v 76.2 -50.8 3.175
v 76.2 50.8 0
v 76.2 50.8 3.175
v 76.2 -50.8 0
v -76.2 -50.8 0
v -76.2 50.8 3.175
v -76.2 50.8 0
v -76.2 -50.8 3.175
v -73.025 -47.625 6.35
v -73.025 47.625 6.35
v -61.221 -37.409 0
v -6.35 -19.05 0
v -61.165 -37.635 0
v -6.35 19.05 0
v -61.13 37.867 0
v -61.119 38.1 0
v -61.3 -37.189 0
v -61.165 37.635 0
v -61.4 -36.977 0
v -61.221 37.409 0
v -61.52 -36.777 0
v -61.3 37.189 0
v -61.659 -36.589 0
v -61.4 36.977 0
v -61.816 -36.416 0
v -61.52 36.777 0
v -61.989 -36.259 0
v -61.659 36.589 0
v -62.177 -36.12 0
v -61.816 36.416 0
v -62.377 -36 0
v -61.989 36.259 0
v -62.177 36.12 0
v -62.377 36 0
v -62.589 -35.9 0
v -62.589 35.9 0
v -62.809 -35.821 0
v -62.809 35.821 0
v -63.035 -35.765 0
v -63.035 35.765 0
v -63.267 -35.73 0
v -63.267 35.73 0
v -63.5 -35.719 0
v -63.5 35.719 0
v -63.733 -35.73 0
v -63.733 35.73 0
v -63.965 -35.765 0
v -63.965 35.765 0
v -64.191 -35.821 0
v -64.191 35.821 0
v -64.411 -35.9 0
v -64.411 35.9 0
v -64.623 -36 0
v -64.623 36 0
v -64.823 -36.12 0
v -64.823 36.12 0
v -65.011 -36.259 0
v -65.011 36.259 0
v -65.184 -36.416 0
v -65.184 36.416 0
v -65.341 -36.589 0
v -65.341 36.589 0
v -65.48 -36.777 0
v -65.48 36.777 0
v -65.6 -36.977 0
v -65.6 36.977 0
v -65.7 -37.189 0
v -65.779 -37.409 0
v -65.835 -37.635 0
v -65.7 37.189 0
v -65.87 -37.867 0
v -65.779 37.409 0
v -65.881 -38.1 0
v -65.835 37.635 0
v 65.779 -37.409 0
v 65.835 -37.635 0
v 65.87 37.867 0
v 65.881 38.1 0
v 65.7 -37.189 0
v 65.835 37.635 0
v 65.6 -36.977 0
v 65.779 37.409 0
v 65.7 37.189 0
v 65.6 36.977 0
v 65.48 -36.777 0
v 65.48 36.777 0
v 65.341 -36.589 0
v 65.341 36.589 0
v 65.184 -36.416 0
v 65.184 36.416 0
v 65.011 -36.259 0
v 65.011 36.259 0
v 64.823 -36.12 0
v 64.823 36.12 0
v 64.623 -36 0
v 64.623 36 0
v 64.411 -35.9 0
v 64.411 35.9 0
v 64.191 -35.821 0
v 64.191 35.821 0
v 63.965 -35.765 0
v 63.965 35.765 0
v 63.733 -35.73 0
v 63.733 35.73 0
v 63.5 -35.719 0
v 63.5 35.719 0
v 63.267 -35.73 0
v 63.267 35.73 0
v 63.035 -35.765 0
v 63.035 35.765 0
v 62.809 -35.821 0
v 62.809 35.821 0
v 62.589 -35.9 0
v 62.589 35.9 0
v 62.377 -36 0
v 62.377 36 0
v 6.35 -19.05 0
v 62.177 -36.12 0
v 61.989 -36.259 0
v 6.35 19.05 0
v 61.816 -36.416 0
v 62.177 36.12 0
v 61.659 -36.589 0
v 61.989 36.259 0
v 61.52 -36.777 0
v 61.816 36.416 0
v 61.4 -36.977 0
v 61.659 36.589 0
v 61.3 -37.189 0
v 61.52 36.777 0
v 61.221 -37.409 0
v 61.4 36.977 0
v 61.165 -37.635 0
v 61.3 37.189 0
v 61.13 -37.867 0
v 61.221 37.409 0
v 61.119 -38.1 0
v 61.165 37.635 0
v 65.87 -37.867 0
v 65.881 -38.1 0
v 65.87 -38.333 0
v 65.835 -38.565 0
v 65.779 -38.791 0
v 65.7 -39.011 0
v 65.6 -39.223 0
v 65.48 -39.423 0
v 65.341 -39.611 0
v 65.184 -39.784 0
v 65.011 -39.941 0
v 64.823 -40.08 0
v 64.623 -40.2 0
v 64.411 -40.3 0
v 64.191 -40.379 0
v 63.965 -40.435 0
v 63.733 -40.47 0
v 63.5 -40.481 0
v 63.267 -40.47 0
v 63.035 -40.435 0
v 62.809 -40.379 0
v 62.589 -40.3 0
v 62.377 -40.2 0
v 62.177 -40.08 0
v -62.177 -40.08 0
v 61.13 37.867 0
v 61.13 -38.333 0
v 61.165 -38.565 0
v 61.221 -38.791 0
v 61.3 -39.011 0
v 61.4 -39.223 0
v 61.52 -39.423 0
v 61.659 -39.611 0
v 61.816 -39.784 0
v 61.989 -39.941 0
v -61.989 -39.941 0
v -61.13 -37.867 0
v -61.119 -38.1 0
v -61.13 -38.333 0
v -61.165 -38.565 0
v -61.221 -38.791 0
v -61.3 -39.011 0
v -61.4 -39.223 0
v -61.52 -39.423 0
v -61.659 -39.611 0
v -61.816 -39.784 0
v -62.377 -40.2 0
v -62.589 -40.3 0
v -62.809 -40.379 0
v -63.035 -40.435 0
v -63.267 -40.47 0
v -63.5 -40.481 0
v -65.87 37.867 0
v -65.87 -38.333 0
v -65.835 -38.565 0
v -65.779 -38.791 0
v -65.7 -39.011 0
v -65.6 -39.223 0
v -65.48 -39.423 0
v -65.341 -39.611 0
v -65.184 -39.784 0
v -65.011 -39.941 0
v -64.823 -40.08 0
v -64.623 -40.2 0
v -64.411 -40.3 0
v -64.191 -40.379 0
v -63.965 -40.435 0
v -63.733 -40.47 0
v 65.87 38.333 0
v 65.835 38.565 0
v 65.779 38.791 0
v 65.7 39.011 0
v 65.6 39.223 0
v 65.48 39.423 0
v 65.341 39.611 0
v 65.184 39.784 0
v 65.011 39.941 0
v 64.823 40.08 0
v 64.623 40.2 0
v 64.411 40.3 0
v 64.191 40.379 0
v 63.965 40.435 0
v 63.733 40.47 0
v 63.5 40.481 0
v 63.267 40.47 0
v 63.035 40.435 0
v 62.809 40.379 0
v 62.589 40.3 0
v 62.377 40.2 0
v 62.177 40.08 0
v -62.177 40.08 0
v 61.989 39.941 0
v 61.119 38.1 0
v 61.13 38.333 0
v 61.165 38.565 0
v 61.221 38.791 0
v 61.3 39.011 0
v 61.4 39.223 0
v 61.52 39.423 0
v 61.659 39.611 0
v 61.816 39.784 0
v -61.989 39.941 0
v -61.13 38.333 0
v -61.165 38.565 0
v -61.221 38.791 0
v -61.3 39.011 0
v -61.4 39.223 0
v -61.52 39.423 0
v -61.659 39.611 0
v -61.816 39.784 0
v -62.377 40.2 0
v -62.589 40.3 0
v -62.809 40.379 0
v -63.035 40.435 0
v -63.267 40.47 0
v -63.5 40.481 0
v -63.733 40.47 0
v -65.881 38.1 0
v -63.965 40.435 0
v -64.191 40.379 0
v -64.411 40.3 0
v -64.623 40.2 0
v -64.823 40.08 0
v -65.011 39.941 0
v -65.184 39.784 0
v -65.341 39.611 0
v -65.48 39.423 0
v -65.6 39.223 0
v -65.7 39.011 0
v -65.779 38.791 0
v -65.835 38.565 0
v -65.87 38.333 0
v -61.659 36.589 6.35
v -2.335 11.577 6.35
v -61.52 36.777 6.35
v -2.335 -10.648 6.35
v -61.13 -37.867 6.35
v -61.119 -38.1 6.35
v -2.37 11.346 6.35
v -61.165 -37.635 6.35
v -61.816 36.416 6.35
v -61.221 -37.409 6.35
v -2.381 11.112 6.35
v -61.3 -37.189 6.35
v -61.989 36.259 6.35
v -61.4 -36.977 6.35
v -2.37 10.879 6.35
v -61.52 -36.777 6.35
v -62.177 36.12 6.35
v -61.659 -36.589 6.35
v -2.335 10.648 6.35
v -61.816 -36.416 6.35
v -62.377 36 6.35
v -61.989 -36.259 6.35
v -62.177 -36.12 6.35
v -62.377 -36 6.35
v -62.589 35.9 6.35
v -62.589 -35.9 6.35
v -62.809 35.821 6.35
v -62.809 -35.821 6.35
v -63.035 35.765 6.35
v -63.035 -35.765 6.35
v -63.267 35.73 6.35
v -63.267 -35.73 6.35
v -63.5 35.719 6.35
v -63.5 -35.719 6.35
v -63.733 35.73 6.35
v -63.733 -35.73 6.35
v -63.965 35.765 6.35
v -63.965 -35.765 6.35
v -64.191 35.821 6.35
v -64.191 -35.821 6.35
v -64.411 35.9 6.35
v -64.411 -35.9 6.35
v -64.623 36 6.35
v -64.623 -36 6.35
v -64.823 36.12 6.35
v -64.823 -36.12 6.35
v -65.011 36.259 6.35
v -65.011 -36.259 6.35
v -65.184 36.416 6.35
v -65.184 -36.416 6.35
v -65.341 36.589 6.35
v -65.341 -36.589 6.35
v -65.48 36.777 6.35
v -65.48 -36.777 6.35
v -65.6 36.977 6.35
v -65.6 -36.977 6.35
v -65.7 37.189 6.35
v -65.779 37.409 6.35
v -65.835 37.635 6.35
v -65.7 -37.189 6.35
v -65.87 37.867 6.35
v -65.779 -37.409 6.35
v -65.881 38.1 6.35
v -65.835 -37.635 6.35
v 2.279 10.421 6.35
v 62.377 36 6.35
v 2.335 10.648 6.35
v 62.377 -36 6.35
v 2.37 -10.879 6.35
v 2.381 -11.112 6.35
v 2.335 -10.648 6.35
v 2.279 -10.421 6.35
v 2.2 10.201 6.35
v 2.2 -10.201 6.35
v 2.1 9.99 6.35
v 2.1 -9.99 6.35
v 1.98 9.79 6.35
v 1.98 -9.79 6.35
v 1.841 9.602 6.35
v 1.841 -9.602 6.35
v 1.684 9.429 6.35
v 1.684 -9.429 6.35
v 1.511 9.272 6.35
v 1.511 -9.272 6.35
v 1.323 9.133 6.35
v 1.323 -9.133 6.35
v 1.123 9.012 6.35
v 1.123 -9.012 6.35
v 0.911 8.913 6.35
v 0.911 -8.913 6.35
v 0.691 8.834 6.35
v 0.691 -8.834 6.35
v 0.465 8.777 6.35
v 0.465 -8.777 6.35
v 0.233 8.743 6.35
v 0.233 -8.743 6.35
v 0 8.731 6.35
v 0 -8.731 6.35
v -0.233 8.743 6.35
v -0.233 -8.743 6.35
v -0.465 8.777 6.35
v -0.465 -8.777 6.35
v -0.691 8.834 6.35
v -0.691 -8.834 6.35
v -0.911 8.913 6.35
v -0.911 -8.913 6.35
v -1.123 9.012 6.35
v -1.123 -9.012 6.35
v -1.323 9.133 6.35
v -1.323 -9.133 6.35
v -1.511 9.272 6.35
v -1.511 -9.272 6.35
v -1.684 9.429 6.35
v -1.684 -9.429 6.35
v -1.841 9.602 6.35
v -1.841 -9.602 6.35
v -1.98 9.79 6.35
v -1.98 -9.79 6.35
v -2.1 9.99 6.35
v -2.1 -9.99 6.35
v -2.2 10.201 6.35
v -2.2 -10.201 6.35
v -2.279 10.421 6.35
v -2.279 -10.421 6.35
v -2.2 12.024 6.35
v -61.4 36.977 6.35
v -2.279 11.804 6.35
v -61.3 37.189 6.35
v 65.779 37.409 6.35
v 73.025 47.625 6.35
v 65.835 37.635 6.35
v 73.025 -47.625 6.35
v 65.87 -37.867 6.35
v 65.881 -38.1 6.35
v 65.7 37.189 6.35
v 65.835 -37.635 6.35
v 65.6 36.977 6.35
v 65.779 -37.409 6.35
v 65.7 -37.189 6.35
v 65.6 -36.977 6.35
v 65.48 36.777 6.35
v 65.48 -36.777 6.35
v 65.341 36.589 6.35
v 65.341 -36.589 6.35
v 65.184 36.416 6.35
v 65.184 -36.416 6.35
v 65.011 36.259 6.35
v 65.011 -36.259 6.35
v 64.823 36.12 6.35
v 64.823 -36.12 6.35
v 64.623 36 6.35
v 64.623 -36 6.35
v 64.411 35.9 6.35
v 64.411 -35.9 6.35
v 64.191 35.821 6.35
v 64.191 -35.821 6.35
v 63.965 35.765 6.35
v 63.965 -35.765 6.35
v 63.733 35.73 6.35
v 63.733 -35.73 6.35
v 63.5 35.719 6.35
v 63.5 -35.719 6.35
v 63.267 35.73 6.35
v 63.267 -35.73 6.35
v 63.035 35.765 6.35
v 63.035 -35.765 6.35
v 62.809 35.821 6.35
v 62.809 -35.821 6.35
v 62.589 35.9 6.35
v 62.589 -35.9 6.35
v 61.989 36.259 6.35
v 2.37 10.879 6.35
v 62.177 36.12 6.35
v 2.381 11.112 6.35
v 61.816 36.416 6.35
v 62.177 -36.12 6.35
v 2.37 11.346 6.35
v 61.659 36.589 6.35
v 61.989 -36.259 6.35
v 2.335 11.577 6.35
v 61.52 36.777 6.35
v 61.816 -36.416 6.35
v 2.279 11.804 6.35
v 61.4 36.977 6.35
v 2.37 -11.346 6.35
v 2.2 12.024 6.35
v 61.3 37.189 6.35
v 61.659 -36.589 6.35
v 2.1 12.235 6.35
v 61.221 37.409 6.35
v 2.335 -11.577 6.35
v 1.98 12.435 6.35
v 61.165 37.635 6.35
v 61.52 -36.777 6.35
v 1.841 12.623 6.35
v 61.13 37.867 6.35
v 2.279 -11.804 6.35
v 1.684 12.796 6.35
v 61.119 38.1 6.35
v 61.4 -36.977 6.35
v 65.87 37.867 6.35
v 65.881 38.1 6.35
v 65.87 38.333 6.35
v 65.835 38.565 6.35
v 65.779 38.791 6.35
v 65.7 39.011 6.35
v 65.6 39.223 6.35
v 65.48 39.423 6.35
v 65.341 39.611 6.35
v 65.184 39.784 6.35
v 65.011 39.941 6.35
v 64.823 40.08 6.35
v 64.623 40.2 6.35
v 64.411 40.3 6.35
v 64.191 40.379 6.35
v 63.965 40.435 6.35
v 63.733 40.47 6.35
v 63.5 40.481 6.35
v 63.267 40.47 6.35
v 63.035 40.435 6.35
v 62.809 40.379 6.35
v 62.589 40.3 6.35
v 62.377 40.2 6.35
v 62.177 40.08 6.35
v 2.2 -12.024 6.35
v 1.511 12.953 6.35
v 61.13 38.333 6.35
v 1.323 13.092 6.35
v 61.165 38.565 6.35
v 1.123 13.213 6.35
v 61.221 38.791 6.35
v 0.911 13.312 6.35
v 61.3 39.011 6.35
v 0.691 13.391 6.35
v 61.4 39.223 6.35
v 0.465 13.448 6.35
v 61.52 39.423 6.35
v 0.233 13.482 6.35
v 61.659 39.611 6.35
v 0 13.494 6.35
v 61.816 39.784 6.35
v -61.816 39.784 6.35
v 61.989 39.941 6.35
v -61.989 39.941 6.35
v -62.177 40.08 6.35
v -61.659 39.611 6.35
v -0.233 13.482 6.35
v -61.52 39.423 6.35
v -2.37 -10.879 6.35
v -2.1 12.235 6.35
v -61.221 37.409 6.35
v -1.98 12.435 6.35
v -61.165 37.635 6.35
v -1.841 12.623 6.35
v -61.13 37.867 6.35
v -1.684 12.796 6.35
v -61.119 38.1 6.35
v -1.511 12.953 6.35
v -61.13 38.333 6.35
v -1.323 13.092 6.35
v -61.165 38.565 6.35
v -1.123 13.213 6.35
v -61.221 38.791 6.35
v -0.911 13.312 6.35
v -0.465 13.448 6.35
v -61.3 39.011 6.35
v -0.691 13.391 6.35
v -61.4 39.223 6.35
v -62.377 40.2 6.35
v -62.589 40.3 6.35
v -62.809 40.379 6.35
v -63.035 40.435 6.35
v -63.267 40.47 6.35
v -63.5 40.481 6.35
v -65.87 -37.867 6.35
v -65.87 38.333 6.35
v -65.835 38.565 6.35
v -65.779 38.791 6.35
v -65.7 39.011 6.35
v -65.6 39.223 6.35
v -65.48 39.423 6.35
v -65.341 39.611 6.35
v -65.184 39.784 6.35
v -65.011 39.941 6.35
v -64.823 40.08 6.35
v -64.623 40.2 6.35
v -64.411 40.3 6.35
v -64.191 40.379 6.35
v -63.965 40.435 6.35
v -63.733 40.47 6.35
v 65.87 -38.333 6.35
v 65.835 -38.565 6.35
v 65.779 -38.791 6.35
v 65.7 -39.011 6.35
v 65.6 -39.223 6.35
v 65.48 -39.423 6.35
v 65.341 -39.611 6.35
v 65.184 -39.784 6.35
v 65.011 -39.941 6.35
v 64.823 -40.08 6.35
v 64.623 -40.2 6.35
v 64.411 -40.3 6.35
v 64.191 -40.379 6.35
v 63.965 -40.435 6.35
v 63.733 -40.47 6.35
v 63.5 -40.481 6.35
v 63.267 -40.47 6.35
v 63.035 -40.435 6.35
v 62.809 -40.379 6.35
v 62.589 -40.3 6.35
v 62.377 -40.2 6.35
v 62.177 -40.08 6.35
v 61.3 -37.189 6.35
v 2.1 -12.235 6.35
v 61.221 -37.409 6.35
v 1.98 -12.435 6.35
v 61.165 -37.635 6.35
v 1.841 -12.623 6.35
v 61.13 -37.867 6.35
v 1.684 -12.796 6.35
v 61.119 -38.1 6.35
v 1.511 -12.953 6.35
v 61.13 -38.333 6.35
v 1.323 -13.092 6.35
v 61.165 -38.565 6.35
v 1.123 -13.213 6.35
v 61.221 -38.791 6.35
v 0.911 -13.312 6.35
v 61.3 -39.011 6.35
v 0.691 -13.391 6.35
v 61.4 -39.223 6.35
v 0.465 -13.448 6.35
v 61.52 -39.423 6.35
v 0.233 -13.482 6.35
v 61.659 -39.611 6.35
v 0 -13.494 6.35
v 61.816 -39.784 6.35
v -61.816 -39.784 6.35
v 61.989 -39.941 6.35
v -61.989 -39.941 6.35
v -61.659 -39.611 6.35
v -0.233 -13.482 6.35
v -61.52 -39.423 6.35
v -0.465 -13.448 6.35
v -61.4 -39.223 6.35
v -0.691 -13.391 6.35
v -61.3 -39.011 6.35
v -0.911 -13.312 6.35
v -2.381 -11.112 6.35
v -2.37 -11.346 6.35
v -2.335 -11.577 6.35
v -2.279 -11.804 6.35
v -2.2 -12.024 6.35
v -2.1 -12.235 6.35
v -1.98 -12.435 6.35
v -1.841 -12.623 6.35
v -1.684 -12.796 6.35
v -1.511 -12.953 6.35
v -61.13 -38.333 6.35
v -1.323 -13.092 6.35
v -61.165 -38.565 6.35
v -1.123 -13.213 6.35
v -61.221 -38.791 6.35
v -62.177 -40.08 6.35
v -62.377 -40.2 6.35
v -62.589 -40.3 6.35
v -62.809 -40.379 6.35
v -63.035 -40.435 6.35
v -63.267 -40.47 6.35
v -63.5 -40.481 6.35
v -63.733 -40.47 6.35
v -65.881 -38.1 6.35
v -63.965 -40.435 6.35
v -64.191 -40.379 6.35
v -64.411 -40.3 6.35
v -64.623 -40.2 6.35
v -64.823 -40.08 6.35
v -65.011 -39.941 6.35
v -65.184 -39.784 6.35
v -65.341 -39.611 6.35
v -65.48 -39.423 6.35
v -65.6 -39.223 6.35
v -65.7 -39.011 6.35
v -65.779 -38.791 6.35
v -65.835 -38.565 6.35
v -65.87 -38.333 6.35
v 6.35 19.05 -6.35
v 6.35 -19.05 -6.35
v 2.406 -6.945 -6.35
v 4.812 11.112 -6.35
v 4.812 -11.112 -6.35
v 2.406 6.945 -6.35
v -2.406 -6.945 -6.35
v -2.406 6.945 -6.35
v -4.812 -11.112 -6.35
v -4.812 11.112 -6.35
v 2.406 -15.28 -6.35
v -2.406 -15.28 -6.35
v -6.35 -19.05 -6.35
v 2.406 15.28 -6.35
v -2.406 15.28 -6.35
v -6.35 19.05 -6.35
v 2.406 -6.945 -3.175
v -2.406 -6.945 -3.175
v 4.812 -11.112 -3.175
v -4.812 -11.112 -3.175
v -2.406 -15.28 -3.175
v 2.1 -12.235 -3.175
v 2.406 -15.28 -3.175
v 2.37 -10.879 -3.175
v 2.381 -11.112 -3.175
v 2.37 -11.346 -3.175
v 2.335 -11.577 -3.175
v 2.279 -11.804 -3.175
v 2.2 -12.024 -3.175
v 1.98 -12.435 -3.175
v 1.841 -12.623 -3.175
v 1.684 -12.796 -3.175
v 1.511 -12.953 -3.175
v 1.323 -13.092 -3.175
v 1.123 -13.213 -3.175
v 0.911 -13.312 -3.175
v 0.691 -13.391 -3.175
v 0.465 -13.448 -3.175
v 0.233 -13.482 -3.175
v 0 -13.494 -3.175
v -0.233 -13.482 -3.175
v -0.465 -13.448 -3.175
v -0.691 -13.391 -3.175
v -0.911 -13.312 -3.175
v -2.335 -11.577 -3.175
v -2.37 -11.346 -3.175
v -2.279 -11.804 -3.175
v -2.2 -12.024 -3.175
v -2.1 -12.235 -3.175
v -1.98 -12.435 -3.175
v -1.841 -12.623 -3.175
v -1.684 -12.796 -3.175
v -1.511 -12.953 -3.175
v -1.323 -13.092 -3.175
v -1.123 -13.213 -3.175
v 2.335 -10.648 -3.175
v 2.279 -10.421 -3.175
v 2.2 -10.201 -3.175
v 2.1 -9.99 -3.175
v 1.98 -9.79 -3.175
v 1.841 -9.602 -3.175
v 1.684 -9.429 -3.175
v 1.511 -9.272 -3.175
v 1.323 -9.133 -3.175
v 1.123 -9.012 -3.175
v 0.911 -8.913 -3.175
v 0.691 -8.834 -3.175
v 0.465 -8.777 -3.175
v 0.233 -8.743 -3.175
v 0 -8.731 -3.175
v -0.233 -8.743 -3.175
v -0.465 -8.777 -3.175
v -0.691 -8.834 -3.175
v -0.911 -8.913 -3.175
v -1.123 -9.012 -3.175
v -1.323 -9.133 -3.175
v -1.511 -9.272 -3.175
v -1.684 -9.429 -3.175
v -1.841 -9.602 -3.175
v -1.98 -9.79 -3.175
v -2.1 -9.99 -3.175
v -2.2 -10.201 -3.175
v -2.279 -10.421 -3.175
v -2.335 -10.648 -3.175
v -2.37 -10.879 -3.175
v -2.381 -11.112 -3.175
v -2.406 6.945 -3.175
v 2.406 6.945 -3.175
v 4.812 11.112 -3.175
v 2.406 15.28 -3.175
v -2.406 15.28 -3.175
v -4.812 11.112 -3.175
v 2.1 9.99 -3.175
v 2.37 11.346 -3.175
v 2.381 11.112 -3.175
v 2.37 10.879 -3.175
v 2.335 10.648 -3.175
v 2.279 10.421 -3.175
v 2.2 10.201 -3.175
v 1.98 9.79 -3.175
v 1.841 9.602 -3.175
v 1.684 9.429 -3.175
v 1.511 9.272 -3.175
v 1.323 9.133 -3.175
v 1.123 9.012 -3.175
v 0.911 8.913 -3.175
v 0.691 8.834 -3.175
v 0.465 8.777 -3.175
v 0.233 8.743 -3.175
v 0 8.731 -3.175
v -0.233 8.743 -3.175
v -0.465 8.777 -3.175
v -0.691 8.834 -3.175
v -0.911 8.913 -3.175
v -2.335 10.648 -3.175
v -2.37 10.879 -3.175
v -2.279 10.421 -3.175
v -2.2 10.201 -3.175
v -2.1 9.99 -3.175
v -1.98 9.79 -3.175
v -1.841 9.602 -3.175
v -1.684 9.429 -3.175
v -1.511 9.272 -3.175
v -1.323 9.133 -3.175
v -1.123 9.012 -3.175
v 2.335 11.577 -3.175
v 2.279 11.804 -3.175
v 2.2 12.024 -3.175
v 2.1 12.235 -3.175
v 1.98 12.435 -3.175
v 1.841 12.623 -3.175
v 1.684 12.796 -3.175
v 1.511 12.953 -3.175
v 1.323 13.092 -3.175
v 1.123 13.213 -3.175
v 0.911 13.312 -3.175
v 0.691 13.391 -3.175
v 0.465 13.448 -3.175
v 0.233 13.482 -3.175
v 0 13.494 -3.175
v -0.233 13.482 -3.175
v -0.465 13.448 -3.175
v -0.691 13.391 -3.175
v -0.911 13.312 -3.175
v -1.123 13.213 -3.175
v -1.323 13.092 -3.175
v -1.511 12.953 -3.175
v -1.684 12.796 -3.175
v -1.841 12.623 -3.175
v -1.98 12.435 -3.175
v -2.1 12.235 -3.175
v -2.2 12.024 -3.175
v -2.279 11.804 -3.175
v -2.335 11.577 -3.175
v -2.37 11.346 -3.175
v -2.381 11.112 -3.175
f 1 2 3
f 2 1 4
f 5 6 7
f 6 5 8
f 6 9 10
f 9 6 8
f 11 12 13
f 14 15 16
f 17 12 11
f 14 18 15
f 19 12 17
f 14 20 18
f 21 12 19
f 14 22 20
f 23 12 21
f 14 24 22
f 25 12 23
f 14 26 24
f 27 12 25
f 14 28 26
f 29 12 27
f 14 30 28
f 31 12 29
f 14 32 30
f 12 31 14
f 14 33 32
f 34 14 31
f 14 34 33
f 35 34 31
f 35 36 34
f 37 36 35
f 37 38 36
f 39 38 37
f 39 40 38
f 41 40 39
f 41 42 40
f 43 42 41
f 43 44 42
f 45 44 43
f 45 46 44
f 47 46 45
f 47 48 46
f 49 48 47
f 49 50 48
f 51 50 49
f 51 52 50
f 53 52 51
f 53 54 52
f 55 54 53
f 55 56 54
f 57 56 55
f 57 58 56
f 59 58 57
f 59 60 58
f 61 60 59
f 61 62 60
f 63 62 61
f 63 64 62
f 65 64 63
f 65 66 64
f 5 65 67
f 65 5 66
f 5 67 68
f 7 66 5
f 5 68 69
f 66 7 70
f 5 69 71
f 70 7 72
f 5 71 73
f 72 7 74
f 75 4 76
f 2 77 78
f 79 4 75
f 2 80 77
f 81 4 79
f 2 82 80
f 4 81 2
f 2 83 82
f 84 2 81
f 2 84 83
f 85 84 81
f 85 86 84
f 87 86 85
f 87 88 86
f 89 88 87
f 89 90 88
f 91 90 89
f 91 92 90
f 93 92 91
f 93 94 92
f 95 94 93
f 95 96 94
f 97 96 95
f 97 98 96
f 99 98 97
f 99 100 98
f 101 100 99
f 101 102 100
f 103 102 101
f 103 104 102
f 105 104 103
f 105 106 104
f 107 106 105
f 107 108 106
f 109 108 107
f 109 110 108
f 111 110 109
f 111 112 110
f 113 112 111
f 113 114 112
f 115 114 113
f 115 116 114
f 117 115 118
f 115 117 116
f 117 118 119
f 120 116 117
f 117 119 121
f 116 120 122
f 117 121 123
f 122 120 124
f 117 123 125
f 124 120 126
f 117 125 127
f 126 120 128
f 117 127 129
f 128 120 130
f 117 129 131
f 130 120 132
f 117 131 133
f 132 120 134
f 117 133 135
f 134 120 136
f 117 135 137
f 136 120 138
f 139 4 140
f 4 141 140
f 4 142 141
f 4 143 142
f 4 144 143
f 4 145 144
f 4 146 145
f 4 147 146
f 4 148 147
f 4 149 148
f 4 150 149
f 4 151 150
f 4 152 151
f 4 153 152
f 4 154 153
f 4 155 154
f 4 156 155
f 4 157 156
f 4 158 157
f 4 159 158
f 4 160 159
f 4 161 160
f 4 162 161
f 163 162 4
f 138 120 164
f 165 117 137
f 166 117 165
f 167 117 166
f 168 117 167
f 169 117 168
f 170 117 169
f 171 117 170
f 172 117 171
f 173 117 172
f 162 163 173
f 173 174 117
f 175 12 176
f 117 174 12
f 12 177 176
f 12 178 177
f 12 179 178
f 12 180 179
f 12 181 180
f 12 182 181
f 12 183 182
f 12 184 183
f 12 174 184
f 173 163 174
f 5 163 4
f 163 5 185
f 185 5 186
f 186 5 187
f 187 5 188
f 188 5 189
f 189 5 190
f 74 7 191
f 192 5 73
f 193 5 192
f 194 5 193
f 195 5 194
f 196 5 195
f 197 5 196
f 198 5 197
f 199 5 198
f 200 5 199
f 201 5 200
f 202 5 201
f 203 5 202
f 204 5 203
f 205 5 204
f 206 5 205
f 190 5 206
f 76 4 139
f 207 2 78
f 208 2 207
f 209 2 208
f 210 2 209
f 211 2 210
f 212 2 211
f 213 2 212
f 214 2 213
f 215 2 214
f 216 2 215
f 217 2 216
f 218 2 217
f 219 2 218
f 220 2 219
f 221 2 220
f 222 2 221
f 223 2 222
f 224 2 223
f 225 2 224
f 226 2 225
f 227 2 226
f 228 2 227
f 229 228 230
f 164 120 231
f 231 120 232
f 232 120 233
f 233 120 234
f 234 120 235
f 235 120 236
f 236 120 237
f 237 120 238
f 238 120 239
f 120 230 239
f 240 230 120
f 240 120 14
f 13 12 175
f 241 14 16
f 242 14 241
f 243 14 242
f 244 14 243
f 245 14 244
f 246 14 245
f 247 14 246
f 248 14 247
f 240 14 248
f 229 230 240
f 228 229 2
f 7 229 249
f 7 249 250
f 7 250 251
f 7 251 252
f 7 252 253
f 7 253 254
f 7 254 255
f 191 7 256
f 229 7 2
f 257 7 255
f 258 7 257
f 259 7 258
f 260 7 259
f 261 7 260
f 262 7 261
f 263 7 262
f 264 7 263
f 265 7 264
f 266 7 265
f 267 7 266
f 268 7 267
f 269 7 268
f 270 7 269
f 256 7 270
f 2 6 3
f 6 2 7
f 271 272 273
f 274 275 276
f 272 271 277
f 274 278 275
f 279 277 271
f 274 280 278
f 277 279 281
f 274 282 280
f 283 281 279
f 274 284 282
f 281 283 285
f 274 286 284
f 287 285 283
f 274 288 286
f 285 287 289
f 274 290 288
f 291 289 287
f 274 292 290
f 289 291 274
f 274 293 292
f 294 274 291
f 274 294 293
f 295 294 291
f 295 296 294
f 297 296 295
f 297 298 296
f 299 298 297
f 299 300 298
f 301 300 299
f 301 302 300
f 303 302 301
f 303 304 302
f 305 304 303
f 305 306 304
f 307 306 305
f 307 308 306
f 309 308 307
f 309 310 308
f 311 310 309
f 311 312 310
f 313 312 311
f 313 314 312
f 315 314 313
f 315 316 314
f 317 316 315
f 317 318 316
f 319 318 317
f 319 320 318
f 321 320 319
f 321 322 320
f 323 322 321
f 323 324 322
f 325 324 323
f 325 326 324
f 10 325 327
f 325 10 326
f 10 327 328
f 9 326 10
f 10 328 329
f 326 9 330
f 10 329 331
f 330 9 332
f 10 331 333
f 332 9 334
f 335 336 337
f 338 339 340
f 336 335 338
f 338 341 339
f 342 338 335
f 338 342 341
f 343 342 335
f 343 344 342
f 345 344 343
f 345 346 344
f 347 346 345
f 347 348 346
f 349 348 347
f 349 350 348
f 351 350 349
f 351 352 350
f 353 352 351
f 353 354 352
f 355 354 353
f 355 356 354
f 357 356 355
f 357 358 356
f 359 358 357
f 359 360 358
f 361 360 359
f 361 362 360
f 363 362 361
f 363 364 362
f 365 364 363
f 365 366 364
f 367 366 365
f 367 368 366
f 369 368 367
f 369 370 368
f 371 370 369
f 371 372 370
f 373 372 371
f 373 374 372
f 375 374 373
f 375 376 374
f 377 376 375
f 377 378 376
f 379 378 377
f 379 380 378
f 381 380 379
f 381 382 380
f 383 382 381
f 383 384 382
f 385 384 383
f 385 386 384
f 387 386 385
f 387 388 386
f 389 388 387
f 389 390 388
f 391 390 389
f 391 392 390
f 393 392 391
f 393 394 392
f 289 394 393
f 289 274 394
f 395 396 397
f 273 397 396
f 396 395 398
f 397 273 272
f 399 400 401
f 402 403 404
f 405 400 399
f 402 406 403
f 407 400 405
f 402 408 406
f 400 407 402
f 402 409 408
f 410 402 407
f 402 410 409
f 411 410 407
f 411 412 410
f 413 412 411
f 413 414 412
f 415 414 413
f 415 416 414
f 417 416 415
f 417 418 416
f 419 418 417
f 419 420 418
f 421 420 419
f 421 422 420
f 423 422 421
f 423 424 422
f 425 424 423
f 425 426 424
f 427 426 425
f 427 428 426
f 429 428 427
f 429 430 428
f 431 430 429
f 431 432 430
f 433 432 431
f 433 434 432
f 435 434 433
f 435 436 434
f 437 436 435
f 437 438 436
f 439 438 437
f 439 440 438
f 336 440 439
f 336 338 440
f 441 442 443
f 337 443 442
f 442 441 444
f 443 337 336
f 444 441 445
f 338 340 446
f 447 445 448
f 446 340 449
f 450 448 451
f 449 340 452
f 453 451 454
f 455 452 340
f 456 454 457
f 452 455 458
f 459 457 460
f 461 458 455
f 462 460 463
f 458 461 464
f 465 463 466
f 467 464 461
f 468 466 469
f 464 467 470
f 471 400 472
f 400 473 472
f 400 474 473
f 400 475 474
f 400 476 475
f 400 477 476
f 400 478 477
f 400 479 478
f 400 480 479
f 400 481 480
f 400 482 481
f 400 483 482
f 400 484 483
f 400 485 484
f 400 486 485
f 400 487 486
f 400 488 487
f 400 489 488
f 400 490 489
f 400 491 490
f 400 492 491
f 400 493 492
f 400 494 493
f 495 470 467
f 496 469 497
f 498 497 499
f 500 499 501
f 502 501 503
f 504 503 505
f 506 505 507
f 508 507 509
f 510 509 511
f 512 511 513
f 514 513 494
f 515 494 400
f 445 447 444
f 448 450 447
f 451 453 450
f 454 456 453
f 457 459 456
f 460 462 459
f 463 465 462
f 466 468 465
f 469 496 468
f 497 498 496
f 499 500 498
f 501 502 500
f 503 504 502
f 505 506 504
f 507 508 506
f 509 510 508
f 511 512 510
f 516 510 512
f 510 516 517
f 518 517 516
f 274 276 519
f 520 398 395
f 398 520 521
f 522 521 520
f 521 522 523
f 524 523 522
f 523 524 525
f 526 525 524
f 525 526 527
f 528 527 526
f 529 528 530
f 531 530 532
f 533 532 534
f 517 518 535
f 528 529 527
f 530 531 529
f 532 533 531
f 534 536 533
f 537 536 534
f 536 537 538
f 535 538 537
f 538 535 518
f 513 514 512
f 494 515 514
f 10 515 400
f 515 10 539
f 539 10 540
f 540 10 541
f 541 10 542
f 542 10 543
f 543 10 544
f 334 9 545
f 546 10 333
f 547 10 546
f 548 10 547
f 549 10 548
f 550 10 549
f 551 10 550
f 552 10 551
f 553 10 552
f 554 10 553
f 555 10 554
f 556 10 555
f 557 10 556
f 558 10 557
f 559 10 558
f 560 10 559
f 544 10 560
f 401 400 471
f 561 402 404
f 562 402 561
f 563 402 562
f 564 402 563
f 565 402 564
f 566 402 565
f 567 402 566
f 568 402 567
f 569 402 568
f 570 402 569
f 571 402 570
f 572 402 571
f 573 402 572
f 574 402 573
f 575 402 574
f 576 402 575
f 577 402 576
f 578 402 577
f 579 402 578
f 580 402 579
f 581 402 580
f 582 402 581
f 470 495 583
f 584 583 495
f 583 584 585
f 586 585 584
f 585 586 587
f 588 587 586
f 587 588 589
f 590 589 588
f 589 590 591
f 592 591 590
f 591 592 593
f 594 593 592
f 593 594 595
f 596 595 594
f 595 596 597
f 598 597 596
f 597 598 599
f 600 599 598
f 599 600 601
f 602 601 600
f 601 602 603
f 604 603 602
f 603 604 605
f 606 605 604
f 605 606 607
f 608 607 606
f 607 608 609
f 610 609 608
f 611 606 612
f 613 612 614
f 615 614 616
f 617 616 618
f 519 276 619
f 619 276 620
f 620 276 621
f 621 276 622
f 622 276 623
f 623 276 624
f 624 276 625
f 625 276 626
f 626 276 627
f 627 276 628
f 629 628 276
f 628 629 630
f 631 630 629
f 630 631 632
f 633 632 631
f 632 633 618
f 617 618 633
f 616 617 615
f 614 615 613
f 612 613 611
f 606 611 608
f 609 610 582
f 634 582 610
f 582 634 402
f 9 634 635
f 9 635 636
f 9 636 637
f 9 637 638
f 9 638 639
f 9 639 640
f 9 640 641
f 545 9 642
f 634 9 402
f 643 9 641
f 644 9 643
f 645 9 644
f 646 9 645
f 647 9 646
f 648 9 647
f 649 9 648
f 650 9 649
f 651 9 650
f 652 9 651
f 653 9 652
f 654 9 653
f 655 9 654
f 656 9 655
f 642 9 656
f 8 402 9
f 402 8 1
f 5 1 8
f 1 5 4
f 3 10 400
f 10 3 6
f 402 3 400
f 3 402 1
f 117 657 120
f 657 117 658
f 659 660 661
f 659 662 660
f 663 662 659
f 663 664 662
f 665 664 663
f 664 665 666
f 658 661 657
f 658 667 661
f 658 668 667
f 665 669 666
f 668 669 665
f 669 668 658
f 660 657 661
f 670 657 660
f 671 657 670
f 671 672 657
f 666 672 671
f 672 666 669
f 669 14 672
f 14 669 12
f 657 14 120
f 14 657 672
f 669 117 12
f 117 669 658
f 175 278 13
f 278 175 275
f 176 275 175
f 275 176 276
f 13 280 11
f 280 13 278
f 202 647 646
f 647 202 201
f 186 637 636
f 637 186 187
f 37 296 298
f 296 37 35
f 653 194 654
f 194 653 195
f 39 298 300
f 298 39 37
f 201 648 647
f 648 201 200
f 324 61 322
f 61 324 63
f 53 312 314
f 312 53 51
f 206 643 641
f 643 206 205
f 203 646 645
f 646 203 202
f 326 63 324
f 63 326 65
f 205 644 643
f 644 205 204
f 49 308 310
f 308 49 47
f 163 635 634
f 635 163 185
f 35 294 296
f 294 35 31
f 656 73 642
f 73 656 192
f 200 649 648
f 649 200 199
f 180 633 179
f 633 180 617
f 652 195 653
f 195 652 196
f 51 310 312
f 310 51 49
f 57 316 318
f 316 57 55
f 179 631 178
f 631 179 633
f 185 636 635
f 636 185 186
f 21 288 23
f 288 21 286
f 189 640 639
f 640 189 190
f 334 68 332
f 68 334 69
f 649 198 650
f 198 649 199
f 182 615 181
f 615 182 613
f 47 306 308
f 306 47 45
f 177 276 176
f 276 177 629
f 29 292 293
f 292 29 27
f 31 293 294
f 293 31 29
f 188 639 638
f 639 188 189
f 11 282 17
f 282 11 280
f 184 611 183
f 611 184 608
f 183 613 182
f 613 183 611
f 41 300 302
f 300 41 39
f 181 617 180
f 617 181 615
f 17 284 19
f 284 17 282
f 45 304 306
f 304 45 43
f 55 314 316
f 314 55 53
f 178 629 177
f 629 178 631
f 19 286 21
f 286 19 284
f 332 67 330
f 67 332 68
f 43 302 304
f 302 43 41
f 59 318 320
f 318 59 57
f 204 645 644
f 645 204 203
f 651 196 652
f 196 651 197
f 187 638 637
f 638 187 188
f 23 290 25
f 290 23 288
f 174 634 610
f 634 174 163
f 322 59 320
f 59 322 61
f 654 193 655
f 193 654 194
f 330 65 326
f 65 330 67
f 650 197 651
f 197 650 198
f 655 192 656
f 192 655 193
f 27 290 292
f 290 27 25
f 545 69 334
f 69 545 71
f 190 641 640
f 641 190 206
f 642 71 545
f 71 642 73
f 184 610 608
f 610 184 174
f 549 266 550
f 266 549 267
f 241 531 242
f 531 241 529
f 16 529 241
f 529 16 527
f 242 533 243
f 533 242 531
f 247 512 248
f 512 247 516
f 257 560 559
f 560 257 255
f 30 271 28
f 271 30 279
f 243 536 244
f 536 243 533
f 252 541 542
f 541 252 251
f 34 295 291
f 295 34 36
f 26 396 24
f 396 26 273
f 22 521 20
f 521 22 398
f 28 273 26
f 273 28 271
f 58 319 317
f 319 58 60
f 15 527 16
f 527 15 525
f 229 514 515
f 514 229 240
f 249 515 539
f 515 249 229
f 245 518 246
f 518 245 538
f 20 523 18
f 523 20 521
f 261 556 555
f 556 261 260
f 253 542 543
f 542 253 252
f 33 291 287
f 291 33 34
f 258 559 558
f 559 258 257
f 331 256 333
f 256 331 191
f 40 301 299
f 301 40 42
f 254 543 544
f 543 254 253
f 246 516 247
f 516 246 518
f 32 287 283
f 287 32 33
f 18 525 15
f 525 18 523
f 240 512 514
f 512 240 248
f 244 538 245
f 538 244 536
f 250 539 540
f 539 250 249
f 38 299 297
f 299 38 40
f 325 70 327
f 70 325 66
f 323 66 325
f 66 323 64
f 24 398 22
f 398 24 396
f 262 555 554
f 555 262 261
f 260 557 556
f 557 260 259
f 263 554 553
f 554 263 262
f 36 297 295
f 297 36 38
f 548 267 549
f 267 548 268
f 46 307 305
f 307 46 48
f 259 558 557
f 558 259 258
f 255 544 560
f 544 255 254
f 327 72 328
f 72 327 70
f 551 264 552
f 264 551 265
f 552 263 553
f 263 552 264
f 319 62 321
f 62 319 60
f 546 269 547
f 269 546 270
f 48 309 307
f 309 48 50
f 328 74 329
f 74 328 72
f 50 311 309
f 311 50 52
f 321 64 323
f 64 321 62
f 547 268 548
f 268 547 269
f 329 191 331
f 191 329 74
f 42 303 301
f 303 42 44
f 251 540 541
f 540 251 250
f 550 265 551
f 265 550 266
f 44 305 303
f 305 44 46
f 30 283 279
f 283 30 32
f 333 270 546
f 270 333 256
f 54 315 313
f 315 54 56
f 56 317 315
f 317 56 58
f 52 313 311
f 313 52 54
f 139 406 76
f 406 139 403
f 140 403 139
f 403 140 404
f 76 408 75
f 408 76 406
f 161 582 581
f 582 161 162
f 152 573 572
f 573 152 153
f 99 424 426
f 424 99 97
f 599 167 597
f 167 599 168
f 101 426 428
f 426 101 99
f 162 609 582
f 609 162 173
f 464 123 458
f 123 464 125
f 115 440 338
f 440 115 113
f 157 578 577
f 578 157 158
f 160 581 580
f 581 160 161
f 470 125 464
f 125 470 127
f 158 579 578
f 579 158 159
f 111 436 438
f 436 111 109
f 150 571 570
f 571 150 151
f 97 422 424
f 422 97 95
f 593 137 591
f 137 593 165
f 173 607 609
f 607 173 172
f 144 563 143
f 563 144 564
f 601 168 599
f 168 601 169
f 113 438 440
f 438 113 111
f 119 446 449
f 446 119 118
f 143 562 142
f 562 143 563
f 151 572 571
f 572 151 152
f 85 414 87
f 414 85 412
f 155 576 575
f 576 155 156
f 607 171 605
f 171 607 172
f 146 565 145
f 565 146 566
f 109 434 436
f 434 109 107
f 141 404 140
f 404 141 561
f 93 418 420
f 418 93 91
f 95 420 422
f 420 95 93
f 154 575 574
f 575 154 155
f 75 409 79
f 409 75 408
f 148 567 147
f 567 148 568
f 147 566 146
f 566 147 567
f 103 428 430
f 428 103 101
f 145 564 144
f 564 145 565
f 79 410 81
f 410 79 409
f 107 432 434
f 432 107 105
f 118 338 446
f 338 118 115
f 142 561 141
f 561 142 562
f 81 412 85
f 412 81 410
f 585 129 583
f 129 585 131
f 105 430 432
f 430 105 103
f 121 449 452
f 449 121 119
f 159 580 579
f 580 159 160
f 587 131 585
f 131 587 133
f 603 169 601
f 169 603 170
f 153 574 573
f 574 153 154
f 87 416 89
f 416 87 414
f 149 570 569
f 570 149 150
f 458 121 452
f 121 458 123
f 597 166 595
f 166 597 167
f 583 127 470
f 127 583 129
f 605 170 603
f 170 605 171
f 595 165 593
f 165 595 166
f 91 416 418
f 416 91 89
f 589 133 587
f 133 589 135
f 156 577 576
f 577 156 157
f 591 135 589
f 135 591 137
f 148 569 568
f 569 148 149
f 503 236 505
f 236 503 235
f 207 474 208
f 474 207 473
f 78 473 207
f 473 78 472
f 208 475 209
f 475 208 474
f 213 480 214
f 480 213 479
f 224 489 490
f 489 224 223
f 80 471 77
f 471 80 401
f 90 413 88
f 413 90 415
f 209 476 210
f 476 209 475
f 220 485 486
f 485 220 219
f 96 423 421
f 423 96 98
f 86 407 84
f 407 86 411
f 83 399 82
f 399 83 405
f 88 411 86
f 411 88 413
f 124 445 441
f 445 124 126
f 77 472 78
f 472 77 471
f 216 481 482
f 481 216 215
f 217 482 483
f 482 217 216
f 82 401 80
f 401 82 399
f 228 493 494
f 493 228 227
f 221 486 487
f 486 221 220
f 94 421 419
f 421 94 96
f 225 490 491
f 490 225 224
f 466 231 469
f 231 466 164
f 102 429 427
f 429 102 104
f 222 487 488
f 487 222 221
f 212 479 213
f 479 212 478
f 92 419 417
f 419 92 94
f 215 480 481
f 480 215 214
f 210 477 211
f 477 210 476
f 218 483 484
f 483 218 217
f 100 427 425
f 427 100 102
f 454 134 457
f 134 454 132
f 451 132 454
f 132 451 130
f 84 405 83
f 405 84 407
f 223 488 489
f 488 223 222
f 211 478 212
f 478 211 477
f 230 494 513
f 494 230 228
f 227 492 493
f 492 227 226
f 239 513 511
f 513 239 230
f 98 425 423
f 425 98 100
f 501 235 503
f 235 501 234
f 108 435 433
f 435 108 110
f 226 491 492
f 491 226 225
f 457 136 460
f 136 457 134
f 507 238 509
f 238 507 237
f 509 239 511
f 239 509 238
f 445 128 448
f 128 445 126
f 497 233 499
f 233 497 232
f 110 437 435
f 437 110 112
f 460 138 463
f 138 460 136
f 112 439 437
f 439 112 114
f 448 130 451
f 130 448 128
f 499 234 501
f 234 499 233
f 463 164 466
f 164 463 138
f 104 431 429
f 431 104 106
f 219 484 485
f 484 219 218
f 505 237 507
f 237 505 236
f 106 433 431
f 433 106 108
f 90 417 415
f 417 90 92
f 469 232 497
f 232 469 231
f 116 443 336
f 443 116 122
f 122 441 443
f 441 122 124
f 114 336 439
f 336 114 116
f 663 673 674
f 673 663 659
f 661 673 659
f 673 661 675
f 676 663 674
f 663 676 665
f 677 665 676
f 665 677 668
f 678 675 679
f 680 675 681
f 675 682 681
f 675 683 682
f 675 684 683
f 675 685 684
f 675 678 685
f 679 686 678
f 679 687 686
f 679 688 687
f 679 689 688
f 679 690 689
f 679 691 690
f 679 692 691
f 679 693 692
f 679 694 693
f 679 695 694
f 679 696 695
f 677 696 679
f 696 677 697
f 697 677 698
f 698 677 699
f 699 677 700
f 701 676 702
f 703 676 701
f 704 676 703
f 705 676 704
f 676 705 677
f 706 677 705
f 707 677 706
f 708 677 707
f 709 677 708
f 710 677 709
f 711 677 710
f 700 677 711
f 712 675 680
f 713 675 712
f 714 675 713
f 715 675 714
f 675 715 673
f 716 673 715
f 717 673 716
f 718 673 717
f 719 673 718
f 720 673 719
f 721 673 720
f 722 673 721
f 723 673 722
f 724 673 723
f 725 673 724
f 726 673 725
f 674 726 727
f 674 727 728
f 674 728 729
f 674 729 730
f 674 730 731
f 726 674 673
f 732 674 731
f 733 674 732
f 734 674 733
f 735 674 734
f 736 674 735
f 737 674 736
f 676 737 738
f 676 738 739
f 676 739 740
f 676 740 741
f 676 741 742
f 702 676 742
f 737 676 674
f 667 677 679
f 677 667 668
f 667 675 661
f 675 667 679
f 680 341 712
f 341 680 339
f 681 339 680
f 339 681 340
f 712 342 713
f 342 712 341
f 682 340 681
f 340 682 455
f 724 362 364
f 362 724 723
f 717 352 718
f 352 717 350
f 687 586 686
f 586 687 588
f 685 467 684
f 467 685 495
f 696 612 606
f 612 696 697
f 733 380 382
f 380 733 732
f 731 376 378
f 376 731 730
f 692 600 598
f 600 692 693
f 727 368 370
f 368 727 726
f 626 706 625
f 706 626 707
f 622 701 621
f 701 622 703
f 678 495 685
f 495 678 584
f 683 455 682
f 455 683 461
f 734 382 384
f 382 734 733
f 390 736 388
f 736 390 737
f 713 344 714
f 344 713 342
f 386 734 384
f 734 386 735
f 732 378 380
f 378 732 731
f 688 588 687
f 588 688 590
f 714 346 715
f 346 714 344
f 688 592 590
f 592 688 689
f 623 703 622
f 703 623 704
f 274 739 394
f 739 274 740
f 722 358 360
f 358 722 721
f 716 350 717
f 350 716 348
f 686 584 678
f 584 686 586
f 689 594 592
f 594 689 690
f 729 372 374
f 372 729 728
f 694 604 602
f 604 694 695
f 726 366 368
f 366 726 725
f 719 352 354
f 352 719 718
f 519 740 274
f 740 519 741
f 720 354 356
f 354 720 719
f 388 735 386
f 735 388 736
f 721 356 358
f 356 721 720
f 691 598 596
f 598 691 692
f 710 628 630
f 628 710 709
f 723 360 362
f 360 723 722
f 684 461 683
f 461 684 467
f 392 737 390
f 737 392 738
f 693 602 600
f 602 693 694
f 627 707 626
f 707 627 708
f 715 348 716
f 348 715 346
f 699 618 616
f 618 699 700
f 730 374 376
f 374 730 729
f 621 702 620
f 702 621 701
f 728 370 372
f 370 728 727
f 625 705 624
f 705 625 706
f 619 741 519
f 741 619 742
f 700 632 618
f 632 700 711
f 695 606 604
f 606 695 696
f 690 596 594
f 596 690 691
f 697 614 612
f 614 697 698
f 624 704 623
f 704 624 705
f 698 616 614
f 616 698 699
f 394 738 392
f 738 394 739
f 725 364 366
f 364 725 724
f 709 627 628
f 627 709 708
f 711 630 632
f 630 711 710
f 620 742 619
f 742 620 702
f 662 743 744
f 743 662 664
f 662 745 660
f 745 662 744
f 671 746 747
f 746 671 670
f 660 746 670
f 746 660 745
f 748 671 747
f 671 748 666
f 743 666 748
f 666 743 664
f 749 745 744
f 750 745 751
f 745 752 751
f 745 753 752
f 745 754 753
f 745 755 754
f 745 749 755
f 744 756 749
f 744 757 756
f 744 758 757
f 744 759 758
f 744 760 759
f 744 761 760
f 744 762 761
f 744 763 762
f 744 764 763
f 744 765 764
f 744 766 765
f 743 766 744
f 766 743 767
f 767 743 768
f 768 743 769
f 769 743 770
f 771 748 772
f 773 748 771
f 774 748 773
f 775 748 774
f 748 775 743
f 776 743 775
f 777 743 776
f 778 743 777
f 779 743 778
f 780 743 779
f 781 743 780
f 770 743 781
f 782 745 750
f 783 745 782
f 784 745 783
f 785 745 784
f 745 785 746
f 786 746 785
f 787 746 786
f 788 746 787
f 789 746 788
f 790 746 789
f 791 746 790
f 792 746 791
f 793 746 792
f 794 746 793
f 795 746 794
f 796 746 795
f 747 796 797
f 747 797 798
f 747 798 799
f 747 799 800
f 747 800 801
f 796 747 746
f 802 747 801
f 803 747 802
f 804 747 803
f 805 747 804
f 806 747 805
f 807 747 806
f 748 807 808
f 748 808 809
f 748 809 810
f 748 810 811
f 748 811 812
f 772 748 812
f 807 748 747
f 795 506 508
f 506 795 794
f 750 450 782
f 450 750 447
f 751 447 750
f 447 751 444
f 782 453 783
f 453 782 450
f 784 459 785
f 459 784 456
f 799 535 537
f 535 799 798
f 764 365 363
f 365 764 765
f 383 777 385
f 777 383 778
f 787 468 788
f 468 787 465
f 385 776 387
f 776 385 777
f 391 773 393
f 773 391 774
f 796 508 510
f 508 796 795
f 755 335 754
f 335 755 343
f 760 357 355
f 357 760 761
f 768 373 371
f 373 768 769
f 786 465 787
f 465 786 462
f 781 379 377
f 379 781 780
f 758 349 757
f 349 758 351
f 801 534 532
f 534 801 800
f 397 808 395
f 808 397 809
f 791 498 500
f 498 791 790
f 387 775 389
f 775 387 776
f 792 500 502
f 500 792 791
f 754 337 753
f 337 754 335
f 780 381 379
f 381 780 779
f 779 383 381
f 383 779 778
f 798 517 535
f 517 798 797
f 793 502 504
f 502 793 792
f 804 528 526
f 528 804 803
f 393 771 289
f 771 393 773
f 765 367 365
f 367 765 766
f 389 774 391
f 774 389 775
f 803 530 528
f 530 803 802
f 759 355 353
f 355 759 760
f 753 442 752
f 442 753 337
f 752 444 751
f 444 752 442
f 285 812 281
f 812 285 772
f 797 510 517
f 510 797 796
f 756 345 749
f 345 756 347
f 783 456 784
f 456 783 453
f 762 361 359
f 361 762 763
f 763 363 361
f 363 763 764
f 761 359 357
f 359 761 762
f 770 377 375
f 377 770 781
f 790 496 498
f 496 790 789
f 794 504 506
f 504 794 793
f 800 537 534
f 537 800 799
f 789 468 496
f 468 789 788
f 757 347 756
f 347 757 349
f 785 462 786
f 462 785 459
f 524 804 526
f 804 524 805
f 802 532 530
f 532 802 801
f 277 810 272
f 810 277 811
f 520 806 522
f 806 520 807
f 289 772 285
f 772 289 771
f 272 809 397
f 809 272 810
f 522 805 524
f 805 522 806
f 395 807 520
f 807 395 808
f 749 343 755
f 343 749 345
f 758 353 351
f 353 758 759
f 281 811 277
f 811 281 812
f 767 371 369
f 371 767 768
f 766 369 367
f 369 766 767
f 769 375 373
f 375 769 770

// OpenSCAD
/**
 * Parametric mounting plate to secure curtain rod brackets to walls or trim.
 * All dimensions are in millimeters.
 */

/* [Plate] */
// Width of the mounting plate
Plate_Width = 152.4;

// Depth of the mounting plate
Plate_Depth = 101.6;

// Thickness of the mounting plate
Plate_Thickness = 6.35;

// Chamfer size along the top edges
Edge_Chamfer = 3.175;

/* [Nut Boss] */
// Width of the boss block
Boss_Width = 12.7;

// Depth of the boss block
Boss_Depth = 38.1;

// Rear protrusion of the boss block
Boss_Thickness = 6.35;

// Offset of the boss along X from the plate center
Boss_Offset = 0;

// Number of hex nut pockets
Nut_Count = 2; // [1:1:10]

// Vertical center-to-center distance between the outermost nut pockets
Nut_Span = 22.225;

// Distance across the flats of the hex nut
Nut_Width_Across_Flats = 8.334375;

// Depth of each hex nut pocket
Nut_Pocket_Depth = 3.175;

/* [Screw Holes] */
// Diameter of the wall screw holes and bracket screw holes through the boss (4.7625 for #8 screws)
Screw_Hole_Diameter = 4.7625;

// Number of wall screw holes per side
Hole_Count = 2; // [1:1:10]

// Vertical center-to-center distance between the outermost holes per side
Hole_Span = 76.2;

// Distance from the side edge to the screw hole centers
Hole_Edge_Inset = 12.7;

/* [Hidden] */
$fn = 64;
EPSILON = 0.254;

// Generates the base plate with top-edge chamfers via convex hull.
module chamfered_plate(width = Plate_Width, height = Plate_Depth, thickness = Plate_Thickness, chamfer = Edge_Chamfer) {
  if (chamfer > 0 && chamfer < min(width / 2, height / 2, thickness)) {
    hull() {
      translate([0, 0, (thickness - chamfer) / 2])
        cube([width, height, thickness - chamfer], center = true);
      translate([0, 0, thickness - EPSILON / 2])
        cube([width - 2 * chamfer, height - 2 * chamfer, EPSILON], center = true);
    }
  } else {
    translate([0, 0, thickness / 2])
      cube([width, height, thickness], center = true);
  }
}

// Generates wall mounting screw clearance holes along left and right margins.
module mounting_hole_pattern(width = Plate_Width, thickness = Plate_Thickness, hole_dia = Screw_Hole_Diameter, side_margin = Hole_Edge_Inset, count = Hole_Count, spacing = Hole_Span) {
  x_positions = [-width / 2 + side_margin, width / 2 - side_margin];

  for (x = x_positions) {
    if (count <= 1) {
      translate([x, 0, -EPSILON])
        cylinder(d = hole_dia, h = thickness + 2 * EPSILON);
    } else {
      for (i = [0 : count - 1]) {
        y = -spacing / 2 + i * (spacing / (count - 1));
        translate([x, y, -EPSILON])
          cylinder(d = hole_dia, h = thickness + 2 * EPSILON);
      }
    }
  }
}

// Generates the raised rear boss block to house hex nuts for bracket mounting screws.
module hex_nut_boss(width = Boss_Width, height = Boss_Depth, thickness = Boss_Thickness, x_offset = Boss_Offset) {
  translate([x_offset, 0, -thickness / 2])
    cube([width, height, thickness], center = true);
}

// Generates hex nut pockets and screw clearance through-holes in the boss.
module hex_nut_boss_pattern(thickness = Boss_Thickness, plate_thick = Plate_Thickness, x_offset = Boss_Offset, flats_dia = Nut_Width_Across_Flats, nut_depth = Nut_Pocket_Depth, count = Nut_Count, spacing = Nut_Span, screw_dia = Screw_Hole_Diameter) {
  // Convert distance across flats to circumscribed cylinder diameter for 6-sided cylinder
  hex_outer_dia = flats_dia / cos(30);

  if (count <= 1) {
    translate([x_offset, 0, -thickness - EPSILON])
      cylinder(d = hex_outer_dia, h = nut_depth + EPSILON, $fn = 6);
    translate([x_offset, 0, -thickness - EPSILON])
      cylinder(d = screw_dia, h = thickness + plate_thick + 2 * EPSILON);
  } else {
    for (i = [0 : count - 1]) {
      y = -spacing / 2 + i * (spacing / (count - 1));
      translate([x_offset, y, -thickness - EPSILON])
        cylinder(d = hex_outer_dia, h = nut_depth + EPSILON, $fn = 6);
      translate([x_offset, y, -thickness - EPSILON])
        cylinder(d = screw_dia, h = thickness + plate_thick + 2 * EPSILON);
    }
  }
}

// Full assembly: plate with boss, minus wall screw and bracket mounting holes.
module curtain_rod_mounting_plate() {
  difference() {
    union() {
      chamfered_plate();
      hex_nut_boss();
    }
    mounting_hole_pattern();
    hex_nut_boss_pattern();
  }
}

curtain_rod_mounting_plate();
